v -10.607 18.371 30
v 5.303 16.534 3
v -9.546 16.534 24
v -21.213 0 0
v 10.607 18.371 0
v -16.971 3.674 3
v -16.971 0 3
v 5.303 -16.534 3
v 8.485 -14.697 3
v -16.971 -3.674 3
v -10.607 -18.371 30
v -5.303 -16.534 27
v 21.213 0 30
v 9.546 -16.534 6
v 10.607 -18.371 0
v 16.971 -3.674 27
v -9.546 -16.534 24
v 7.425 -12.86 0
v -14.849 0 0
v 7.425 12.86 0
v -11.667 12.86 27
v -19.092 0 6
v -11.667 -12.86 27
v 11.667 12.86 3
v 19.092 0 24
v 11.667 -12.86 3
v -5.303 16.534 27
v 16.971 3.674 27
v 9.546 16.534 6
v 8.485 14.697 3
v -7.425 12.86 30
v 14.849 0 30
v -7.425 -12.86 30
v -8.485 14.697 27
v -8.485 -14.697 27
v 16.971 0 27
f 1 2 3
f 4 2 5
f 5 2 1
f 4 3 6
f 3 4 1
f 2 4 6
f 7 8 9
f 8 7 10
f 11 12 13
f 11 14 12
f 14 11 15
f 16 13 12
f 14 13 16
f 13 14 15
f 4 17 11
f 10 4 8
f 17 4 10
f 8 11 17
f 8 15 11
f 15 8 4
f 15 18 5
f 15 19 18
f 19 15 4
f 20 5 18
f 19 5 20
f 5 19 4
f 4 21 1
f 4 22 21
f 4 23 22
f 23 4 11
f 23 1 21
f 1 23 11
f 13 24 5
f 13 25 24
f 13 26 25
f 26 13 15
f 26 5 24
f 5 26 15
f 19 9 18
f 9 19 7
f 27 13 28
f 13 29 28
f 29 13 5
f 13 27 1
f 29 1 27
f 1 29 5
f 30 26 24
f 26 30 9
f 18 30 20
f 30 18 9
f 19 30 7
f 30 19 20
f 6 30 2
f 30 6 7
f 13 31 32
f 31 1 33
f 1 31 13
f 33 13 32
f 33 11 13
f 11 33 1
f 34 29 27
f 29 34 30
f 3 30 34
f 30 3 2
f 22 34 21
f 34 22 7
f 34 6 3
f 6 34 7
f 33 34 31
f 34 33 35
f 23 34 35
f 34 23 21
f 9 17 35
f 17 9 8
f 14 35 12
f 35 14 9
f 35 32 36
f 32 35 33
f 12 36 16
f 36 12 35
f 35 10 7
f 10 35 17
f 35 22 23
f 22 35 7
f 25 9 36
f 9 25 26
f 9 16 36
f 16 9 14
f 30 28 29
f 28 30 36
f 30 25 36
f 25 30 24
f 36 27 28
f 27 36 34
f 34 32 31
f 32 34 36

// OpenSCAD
// shape height
sh = 30;
// border width
bw = 3;

include <../polyhedra.scad>;

poly_wire(octahedron);
